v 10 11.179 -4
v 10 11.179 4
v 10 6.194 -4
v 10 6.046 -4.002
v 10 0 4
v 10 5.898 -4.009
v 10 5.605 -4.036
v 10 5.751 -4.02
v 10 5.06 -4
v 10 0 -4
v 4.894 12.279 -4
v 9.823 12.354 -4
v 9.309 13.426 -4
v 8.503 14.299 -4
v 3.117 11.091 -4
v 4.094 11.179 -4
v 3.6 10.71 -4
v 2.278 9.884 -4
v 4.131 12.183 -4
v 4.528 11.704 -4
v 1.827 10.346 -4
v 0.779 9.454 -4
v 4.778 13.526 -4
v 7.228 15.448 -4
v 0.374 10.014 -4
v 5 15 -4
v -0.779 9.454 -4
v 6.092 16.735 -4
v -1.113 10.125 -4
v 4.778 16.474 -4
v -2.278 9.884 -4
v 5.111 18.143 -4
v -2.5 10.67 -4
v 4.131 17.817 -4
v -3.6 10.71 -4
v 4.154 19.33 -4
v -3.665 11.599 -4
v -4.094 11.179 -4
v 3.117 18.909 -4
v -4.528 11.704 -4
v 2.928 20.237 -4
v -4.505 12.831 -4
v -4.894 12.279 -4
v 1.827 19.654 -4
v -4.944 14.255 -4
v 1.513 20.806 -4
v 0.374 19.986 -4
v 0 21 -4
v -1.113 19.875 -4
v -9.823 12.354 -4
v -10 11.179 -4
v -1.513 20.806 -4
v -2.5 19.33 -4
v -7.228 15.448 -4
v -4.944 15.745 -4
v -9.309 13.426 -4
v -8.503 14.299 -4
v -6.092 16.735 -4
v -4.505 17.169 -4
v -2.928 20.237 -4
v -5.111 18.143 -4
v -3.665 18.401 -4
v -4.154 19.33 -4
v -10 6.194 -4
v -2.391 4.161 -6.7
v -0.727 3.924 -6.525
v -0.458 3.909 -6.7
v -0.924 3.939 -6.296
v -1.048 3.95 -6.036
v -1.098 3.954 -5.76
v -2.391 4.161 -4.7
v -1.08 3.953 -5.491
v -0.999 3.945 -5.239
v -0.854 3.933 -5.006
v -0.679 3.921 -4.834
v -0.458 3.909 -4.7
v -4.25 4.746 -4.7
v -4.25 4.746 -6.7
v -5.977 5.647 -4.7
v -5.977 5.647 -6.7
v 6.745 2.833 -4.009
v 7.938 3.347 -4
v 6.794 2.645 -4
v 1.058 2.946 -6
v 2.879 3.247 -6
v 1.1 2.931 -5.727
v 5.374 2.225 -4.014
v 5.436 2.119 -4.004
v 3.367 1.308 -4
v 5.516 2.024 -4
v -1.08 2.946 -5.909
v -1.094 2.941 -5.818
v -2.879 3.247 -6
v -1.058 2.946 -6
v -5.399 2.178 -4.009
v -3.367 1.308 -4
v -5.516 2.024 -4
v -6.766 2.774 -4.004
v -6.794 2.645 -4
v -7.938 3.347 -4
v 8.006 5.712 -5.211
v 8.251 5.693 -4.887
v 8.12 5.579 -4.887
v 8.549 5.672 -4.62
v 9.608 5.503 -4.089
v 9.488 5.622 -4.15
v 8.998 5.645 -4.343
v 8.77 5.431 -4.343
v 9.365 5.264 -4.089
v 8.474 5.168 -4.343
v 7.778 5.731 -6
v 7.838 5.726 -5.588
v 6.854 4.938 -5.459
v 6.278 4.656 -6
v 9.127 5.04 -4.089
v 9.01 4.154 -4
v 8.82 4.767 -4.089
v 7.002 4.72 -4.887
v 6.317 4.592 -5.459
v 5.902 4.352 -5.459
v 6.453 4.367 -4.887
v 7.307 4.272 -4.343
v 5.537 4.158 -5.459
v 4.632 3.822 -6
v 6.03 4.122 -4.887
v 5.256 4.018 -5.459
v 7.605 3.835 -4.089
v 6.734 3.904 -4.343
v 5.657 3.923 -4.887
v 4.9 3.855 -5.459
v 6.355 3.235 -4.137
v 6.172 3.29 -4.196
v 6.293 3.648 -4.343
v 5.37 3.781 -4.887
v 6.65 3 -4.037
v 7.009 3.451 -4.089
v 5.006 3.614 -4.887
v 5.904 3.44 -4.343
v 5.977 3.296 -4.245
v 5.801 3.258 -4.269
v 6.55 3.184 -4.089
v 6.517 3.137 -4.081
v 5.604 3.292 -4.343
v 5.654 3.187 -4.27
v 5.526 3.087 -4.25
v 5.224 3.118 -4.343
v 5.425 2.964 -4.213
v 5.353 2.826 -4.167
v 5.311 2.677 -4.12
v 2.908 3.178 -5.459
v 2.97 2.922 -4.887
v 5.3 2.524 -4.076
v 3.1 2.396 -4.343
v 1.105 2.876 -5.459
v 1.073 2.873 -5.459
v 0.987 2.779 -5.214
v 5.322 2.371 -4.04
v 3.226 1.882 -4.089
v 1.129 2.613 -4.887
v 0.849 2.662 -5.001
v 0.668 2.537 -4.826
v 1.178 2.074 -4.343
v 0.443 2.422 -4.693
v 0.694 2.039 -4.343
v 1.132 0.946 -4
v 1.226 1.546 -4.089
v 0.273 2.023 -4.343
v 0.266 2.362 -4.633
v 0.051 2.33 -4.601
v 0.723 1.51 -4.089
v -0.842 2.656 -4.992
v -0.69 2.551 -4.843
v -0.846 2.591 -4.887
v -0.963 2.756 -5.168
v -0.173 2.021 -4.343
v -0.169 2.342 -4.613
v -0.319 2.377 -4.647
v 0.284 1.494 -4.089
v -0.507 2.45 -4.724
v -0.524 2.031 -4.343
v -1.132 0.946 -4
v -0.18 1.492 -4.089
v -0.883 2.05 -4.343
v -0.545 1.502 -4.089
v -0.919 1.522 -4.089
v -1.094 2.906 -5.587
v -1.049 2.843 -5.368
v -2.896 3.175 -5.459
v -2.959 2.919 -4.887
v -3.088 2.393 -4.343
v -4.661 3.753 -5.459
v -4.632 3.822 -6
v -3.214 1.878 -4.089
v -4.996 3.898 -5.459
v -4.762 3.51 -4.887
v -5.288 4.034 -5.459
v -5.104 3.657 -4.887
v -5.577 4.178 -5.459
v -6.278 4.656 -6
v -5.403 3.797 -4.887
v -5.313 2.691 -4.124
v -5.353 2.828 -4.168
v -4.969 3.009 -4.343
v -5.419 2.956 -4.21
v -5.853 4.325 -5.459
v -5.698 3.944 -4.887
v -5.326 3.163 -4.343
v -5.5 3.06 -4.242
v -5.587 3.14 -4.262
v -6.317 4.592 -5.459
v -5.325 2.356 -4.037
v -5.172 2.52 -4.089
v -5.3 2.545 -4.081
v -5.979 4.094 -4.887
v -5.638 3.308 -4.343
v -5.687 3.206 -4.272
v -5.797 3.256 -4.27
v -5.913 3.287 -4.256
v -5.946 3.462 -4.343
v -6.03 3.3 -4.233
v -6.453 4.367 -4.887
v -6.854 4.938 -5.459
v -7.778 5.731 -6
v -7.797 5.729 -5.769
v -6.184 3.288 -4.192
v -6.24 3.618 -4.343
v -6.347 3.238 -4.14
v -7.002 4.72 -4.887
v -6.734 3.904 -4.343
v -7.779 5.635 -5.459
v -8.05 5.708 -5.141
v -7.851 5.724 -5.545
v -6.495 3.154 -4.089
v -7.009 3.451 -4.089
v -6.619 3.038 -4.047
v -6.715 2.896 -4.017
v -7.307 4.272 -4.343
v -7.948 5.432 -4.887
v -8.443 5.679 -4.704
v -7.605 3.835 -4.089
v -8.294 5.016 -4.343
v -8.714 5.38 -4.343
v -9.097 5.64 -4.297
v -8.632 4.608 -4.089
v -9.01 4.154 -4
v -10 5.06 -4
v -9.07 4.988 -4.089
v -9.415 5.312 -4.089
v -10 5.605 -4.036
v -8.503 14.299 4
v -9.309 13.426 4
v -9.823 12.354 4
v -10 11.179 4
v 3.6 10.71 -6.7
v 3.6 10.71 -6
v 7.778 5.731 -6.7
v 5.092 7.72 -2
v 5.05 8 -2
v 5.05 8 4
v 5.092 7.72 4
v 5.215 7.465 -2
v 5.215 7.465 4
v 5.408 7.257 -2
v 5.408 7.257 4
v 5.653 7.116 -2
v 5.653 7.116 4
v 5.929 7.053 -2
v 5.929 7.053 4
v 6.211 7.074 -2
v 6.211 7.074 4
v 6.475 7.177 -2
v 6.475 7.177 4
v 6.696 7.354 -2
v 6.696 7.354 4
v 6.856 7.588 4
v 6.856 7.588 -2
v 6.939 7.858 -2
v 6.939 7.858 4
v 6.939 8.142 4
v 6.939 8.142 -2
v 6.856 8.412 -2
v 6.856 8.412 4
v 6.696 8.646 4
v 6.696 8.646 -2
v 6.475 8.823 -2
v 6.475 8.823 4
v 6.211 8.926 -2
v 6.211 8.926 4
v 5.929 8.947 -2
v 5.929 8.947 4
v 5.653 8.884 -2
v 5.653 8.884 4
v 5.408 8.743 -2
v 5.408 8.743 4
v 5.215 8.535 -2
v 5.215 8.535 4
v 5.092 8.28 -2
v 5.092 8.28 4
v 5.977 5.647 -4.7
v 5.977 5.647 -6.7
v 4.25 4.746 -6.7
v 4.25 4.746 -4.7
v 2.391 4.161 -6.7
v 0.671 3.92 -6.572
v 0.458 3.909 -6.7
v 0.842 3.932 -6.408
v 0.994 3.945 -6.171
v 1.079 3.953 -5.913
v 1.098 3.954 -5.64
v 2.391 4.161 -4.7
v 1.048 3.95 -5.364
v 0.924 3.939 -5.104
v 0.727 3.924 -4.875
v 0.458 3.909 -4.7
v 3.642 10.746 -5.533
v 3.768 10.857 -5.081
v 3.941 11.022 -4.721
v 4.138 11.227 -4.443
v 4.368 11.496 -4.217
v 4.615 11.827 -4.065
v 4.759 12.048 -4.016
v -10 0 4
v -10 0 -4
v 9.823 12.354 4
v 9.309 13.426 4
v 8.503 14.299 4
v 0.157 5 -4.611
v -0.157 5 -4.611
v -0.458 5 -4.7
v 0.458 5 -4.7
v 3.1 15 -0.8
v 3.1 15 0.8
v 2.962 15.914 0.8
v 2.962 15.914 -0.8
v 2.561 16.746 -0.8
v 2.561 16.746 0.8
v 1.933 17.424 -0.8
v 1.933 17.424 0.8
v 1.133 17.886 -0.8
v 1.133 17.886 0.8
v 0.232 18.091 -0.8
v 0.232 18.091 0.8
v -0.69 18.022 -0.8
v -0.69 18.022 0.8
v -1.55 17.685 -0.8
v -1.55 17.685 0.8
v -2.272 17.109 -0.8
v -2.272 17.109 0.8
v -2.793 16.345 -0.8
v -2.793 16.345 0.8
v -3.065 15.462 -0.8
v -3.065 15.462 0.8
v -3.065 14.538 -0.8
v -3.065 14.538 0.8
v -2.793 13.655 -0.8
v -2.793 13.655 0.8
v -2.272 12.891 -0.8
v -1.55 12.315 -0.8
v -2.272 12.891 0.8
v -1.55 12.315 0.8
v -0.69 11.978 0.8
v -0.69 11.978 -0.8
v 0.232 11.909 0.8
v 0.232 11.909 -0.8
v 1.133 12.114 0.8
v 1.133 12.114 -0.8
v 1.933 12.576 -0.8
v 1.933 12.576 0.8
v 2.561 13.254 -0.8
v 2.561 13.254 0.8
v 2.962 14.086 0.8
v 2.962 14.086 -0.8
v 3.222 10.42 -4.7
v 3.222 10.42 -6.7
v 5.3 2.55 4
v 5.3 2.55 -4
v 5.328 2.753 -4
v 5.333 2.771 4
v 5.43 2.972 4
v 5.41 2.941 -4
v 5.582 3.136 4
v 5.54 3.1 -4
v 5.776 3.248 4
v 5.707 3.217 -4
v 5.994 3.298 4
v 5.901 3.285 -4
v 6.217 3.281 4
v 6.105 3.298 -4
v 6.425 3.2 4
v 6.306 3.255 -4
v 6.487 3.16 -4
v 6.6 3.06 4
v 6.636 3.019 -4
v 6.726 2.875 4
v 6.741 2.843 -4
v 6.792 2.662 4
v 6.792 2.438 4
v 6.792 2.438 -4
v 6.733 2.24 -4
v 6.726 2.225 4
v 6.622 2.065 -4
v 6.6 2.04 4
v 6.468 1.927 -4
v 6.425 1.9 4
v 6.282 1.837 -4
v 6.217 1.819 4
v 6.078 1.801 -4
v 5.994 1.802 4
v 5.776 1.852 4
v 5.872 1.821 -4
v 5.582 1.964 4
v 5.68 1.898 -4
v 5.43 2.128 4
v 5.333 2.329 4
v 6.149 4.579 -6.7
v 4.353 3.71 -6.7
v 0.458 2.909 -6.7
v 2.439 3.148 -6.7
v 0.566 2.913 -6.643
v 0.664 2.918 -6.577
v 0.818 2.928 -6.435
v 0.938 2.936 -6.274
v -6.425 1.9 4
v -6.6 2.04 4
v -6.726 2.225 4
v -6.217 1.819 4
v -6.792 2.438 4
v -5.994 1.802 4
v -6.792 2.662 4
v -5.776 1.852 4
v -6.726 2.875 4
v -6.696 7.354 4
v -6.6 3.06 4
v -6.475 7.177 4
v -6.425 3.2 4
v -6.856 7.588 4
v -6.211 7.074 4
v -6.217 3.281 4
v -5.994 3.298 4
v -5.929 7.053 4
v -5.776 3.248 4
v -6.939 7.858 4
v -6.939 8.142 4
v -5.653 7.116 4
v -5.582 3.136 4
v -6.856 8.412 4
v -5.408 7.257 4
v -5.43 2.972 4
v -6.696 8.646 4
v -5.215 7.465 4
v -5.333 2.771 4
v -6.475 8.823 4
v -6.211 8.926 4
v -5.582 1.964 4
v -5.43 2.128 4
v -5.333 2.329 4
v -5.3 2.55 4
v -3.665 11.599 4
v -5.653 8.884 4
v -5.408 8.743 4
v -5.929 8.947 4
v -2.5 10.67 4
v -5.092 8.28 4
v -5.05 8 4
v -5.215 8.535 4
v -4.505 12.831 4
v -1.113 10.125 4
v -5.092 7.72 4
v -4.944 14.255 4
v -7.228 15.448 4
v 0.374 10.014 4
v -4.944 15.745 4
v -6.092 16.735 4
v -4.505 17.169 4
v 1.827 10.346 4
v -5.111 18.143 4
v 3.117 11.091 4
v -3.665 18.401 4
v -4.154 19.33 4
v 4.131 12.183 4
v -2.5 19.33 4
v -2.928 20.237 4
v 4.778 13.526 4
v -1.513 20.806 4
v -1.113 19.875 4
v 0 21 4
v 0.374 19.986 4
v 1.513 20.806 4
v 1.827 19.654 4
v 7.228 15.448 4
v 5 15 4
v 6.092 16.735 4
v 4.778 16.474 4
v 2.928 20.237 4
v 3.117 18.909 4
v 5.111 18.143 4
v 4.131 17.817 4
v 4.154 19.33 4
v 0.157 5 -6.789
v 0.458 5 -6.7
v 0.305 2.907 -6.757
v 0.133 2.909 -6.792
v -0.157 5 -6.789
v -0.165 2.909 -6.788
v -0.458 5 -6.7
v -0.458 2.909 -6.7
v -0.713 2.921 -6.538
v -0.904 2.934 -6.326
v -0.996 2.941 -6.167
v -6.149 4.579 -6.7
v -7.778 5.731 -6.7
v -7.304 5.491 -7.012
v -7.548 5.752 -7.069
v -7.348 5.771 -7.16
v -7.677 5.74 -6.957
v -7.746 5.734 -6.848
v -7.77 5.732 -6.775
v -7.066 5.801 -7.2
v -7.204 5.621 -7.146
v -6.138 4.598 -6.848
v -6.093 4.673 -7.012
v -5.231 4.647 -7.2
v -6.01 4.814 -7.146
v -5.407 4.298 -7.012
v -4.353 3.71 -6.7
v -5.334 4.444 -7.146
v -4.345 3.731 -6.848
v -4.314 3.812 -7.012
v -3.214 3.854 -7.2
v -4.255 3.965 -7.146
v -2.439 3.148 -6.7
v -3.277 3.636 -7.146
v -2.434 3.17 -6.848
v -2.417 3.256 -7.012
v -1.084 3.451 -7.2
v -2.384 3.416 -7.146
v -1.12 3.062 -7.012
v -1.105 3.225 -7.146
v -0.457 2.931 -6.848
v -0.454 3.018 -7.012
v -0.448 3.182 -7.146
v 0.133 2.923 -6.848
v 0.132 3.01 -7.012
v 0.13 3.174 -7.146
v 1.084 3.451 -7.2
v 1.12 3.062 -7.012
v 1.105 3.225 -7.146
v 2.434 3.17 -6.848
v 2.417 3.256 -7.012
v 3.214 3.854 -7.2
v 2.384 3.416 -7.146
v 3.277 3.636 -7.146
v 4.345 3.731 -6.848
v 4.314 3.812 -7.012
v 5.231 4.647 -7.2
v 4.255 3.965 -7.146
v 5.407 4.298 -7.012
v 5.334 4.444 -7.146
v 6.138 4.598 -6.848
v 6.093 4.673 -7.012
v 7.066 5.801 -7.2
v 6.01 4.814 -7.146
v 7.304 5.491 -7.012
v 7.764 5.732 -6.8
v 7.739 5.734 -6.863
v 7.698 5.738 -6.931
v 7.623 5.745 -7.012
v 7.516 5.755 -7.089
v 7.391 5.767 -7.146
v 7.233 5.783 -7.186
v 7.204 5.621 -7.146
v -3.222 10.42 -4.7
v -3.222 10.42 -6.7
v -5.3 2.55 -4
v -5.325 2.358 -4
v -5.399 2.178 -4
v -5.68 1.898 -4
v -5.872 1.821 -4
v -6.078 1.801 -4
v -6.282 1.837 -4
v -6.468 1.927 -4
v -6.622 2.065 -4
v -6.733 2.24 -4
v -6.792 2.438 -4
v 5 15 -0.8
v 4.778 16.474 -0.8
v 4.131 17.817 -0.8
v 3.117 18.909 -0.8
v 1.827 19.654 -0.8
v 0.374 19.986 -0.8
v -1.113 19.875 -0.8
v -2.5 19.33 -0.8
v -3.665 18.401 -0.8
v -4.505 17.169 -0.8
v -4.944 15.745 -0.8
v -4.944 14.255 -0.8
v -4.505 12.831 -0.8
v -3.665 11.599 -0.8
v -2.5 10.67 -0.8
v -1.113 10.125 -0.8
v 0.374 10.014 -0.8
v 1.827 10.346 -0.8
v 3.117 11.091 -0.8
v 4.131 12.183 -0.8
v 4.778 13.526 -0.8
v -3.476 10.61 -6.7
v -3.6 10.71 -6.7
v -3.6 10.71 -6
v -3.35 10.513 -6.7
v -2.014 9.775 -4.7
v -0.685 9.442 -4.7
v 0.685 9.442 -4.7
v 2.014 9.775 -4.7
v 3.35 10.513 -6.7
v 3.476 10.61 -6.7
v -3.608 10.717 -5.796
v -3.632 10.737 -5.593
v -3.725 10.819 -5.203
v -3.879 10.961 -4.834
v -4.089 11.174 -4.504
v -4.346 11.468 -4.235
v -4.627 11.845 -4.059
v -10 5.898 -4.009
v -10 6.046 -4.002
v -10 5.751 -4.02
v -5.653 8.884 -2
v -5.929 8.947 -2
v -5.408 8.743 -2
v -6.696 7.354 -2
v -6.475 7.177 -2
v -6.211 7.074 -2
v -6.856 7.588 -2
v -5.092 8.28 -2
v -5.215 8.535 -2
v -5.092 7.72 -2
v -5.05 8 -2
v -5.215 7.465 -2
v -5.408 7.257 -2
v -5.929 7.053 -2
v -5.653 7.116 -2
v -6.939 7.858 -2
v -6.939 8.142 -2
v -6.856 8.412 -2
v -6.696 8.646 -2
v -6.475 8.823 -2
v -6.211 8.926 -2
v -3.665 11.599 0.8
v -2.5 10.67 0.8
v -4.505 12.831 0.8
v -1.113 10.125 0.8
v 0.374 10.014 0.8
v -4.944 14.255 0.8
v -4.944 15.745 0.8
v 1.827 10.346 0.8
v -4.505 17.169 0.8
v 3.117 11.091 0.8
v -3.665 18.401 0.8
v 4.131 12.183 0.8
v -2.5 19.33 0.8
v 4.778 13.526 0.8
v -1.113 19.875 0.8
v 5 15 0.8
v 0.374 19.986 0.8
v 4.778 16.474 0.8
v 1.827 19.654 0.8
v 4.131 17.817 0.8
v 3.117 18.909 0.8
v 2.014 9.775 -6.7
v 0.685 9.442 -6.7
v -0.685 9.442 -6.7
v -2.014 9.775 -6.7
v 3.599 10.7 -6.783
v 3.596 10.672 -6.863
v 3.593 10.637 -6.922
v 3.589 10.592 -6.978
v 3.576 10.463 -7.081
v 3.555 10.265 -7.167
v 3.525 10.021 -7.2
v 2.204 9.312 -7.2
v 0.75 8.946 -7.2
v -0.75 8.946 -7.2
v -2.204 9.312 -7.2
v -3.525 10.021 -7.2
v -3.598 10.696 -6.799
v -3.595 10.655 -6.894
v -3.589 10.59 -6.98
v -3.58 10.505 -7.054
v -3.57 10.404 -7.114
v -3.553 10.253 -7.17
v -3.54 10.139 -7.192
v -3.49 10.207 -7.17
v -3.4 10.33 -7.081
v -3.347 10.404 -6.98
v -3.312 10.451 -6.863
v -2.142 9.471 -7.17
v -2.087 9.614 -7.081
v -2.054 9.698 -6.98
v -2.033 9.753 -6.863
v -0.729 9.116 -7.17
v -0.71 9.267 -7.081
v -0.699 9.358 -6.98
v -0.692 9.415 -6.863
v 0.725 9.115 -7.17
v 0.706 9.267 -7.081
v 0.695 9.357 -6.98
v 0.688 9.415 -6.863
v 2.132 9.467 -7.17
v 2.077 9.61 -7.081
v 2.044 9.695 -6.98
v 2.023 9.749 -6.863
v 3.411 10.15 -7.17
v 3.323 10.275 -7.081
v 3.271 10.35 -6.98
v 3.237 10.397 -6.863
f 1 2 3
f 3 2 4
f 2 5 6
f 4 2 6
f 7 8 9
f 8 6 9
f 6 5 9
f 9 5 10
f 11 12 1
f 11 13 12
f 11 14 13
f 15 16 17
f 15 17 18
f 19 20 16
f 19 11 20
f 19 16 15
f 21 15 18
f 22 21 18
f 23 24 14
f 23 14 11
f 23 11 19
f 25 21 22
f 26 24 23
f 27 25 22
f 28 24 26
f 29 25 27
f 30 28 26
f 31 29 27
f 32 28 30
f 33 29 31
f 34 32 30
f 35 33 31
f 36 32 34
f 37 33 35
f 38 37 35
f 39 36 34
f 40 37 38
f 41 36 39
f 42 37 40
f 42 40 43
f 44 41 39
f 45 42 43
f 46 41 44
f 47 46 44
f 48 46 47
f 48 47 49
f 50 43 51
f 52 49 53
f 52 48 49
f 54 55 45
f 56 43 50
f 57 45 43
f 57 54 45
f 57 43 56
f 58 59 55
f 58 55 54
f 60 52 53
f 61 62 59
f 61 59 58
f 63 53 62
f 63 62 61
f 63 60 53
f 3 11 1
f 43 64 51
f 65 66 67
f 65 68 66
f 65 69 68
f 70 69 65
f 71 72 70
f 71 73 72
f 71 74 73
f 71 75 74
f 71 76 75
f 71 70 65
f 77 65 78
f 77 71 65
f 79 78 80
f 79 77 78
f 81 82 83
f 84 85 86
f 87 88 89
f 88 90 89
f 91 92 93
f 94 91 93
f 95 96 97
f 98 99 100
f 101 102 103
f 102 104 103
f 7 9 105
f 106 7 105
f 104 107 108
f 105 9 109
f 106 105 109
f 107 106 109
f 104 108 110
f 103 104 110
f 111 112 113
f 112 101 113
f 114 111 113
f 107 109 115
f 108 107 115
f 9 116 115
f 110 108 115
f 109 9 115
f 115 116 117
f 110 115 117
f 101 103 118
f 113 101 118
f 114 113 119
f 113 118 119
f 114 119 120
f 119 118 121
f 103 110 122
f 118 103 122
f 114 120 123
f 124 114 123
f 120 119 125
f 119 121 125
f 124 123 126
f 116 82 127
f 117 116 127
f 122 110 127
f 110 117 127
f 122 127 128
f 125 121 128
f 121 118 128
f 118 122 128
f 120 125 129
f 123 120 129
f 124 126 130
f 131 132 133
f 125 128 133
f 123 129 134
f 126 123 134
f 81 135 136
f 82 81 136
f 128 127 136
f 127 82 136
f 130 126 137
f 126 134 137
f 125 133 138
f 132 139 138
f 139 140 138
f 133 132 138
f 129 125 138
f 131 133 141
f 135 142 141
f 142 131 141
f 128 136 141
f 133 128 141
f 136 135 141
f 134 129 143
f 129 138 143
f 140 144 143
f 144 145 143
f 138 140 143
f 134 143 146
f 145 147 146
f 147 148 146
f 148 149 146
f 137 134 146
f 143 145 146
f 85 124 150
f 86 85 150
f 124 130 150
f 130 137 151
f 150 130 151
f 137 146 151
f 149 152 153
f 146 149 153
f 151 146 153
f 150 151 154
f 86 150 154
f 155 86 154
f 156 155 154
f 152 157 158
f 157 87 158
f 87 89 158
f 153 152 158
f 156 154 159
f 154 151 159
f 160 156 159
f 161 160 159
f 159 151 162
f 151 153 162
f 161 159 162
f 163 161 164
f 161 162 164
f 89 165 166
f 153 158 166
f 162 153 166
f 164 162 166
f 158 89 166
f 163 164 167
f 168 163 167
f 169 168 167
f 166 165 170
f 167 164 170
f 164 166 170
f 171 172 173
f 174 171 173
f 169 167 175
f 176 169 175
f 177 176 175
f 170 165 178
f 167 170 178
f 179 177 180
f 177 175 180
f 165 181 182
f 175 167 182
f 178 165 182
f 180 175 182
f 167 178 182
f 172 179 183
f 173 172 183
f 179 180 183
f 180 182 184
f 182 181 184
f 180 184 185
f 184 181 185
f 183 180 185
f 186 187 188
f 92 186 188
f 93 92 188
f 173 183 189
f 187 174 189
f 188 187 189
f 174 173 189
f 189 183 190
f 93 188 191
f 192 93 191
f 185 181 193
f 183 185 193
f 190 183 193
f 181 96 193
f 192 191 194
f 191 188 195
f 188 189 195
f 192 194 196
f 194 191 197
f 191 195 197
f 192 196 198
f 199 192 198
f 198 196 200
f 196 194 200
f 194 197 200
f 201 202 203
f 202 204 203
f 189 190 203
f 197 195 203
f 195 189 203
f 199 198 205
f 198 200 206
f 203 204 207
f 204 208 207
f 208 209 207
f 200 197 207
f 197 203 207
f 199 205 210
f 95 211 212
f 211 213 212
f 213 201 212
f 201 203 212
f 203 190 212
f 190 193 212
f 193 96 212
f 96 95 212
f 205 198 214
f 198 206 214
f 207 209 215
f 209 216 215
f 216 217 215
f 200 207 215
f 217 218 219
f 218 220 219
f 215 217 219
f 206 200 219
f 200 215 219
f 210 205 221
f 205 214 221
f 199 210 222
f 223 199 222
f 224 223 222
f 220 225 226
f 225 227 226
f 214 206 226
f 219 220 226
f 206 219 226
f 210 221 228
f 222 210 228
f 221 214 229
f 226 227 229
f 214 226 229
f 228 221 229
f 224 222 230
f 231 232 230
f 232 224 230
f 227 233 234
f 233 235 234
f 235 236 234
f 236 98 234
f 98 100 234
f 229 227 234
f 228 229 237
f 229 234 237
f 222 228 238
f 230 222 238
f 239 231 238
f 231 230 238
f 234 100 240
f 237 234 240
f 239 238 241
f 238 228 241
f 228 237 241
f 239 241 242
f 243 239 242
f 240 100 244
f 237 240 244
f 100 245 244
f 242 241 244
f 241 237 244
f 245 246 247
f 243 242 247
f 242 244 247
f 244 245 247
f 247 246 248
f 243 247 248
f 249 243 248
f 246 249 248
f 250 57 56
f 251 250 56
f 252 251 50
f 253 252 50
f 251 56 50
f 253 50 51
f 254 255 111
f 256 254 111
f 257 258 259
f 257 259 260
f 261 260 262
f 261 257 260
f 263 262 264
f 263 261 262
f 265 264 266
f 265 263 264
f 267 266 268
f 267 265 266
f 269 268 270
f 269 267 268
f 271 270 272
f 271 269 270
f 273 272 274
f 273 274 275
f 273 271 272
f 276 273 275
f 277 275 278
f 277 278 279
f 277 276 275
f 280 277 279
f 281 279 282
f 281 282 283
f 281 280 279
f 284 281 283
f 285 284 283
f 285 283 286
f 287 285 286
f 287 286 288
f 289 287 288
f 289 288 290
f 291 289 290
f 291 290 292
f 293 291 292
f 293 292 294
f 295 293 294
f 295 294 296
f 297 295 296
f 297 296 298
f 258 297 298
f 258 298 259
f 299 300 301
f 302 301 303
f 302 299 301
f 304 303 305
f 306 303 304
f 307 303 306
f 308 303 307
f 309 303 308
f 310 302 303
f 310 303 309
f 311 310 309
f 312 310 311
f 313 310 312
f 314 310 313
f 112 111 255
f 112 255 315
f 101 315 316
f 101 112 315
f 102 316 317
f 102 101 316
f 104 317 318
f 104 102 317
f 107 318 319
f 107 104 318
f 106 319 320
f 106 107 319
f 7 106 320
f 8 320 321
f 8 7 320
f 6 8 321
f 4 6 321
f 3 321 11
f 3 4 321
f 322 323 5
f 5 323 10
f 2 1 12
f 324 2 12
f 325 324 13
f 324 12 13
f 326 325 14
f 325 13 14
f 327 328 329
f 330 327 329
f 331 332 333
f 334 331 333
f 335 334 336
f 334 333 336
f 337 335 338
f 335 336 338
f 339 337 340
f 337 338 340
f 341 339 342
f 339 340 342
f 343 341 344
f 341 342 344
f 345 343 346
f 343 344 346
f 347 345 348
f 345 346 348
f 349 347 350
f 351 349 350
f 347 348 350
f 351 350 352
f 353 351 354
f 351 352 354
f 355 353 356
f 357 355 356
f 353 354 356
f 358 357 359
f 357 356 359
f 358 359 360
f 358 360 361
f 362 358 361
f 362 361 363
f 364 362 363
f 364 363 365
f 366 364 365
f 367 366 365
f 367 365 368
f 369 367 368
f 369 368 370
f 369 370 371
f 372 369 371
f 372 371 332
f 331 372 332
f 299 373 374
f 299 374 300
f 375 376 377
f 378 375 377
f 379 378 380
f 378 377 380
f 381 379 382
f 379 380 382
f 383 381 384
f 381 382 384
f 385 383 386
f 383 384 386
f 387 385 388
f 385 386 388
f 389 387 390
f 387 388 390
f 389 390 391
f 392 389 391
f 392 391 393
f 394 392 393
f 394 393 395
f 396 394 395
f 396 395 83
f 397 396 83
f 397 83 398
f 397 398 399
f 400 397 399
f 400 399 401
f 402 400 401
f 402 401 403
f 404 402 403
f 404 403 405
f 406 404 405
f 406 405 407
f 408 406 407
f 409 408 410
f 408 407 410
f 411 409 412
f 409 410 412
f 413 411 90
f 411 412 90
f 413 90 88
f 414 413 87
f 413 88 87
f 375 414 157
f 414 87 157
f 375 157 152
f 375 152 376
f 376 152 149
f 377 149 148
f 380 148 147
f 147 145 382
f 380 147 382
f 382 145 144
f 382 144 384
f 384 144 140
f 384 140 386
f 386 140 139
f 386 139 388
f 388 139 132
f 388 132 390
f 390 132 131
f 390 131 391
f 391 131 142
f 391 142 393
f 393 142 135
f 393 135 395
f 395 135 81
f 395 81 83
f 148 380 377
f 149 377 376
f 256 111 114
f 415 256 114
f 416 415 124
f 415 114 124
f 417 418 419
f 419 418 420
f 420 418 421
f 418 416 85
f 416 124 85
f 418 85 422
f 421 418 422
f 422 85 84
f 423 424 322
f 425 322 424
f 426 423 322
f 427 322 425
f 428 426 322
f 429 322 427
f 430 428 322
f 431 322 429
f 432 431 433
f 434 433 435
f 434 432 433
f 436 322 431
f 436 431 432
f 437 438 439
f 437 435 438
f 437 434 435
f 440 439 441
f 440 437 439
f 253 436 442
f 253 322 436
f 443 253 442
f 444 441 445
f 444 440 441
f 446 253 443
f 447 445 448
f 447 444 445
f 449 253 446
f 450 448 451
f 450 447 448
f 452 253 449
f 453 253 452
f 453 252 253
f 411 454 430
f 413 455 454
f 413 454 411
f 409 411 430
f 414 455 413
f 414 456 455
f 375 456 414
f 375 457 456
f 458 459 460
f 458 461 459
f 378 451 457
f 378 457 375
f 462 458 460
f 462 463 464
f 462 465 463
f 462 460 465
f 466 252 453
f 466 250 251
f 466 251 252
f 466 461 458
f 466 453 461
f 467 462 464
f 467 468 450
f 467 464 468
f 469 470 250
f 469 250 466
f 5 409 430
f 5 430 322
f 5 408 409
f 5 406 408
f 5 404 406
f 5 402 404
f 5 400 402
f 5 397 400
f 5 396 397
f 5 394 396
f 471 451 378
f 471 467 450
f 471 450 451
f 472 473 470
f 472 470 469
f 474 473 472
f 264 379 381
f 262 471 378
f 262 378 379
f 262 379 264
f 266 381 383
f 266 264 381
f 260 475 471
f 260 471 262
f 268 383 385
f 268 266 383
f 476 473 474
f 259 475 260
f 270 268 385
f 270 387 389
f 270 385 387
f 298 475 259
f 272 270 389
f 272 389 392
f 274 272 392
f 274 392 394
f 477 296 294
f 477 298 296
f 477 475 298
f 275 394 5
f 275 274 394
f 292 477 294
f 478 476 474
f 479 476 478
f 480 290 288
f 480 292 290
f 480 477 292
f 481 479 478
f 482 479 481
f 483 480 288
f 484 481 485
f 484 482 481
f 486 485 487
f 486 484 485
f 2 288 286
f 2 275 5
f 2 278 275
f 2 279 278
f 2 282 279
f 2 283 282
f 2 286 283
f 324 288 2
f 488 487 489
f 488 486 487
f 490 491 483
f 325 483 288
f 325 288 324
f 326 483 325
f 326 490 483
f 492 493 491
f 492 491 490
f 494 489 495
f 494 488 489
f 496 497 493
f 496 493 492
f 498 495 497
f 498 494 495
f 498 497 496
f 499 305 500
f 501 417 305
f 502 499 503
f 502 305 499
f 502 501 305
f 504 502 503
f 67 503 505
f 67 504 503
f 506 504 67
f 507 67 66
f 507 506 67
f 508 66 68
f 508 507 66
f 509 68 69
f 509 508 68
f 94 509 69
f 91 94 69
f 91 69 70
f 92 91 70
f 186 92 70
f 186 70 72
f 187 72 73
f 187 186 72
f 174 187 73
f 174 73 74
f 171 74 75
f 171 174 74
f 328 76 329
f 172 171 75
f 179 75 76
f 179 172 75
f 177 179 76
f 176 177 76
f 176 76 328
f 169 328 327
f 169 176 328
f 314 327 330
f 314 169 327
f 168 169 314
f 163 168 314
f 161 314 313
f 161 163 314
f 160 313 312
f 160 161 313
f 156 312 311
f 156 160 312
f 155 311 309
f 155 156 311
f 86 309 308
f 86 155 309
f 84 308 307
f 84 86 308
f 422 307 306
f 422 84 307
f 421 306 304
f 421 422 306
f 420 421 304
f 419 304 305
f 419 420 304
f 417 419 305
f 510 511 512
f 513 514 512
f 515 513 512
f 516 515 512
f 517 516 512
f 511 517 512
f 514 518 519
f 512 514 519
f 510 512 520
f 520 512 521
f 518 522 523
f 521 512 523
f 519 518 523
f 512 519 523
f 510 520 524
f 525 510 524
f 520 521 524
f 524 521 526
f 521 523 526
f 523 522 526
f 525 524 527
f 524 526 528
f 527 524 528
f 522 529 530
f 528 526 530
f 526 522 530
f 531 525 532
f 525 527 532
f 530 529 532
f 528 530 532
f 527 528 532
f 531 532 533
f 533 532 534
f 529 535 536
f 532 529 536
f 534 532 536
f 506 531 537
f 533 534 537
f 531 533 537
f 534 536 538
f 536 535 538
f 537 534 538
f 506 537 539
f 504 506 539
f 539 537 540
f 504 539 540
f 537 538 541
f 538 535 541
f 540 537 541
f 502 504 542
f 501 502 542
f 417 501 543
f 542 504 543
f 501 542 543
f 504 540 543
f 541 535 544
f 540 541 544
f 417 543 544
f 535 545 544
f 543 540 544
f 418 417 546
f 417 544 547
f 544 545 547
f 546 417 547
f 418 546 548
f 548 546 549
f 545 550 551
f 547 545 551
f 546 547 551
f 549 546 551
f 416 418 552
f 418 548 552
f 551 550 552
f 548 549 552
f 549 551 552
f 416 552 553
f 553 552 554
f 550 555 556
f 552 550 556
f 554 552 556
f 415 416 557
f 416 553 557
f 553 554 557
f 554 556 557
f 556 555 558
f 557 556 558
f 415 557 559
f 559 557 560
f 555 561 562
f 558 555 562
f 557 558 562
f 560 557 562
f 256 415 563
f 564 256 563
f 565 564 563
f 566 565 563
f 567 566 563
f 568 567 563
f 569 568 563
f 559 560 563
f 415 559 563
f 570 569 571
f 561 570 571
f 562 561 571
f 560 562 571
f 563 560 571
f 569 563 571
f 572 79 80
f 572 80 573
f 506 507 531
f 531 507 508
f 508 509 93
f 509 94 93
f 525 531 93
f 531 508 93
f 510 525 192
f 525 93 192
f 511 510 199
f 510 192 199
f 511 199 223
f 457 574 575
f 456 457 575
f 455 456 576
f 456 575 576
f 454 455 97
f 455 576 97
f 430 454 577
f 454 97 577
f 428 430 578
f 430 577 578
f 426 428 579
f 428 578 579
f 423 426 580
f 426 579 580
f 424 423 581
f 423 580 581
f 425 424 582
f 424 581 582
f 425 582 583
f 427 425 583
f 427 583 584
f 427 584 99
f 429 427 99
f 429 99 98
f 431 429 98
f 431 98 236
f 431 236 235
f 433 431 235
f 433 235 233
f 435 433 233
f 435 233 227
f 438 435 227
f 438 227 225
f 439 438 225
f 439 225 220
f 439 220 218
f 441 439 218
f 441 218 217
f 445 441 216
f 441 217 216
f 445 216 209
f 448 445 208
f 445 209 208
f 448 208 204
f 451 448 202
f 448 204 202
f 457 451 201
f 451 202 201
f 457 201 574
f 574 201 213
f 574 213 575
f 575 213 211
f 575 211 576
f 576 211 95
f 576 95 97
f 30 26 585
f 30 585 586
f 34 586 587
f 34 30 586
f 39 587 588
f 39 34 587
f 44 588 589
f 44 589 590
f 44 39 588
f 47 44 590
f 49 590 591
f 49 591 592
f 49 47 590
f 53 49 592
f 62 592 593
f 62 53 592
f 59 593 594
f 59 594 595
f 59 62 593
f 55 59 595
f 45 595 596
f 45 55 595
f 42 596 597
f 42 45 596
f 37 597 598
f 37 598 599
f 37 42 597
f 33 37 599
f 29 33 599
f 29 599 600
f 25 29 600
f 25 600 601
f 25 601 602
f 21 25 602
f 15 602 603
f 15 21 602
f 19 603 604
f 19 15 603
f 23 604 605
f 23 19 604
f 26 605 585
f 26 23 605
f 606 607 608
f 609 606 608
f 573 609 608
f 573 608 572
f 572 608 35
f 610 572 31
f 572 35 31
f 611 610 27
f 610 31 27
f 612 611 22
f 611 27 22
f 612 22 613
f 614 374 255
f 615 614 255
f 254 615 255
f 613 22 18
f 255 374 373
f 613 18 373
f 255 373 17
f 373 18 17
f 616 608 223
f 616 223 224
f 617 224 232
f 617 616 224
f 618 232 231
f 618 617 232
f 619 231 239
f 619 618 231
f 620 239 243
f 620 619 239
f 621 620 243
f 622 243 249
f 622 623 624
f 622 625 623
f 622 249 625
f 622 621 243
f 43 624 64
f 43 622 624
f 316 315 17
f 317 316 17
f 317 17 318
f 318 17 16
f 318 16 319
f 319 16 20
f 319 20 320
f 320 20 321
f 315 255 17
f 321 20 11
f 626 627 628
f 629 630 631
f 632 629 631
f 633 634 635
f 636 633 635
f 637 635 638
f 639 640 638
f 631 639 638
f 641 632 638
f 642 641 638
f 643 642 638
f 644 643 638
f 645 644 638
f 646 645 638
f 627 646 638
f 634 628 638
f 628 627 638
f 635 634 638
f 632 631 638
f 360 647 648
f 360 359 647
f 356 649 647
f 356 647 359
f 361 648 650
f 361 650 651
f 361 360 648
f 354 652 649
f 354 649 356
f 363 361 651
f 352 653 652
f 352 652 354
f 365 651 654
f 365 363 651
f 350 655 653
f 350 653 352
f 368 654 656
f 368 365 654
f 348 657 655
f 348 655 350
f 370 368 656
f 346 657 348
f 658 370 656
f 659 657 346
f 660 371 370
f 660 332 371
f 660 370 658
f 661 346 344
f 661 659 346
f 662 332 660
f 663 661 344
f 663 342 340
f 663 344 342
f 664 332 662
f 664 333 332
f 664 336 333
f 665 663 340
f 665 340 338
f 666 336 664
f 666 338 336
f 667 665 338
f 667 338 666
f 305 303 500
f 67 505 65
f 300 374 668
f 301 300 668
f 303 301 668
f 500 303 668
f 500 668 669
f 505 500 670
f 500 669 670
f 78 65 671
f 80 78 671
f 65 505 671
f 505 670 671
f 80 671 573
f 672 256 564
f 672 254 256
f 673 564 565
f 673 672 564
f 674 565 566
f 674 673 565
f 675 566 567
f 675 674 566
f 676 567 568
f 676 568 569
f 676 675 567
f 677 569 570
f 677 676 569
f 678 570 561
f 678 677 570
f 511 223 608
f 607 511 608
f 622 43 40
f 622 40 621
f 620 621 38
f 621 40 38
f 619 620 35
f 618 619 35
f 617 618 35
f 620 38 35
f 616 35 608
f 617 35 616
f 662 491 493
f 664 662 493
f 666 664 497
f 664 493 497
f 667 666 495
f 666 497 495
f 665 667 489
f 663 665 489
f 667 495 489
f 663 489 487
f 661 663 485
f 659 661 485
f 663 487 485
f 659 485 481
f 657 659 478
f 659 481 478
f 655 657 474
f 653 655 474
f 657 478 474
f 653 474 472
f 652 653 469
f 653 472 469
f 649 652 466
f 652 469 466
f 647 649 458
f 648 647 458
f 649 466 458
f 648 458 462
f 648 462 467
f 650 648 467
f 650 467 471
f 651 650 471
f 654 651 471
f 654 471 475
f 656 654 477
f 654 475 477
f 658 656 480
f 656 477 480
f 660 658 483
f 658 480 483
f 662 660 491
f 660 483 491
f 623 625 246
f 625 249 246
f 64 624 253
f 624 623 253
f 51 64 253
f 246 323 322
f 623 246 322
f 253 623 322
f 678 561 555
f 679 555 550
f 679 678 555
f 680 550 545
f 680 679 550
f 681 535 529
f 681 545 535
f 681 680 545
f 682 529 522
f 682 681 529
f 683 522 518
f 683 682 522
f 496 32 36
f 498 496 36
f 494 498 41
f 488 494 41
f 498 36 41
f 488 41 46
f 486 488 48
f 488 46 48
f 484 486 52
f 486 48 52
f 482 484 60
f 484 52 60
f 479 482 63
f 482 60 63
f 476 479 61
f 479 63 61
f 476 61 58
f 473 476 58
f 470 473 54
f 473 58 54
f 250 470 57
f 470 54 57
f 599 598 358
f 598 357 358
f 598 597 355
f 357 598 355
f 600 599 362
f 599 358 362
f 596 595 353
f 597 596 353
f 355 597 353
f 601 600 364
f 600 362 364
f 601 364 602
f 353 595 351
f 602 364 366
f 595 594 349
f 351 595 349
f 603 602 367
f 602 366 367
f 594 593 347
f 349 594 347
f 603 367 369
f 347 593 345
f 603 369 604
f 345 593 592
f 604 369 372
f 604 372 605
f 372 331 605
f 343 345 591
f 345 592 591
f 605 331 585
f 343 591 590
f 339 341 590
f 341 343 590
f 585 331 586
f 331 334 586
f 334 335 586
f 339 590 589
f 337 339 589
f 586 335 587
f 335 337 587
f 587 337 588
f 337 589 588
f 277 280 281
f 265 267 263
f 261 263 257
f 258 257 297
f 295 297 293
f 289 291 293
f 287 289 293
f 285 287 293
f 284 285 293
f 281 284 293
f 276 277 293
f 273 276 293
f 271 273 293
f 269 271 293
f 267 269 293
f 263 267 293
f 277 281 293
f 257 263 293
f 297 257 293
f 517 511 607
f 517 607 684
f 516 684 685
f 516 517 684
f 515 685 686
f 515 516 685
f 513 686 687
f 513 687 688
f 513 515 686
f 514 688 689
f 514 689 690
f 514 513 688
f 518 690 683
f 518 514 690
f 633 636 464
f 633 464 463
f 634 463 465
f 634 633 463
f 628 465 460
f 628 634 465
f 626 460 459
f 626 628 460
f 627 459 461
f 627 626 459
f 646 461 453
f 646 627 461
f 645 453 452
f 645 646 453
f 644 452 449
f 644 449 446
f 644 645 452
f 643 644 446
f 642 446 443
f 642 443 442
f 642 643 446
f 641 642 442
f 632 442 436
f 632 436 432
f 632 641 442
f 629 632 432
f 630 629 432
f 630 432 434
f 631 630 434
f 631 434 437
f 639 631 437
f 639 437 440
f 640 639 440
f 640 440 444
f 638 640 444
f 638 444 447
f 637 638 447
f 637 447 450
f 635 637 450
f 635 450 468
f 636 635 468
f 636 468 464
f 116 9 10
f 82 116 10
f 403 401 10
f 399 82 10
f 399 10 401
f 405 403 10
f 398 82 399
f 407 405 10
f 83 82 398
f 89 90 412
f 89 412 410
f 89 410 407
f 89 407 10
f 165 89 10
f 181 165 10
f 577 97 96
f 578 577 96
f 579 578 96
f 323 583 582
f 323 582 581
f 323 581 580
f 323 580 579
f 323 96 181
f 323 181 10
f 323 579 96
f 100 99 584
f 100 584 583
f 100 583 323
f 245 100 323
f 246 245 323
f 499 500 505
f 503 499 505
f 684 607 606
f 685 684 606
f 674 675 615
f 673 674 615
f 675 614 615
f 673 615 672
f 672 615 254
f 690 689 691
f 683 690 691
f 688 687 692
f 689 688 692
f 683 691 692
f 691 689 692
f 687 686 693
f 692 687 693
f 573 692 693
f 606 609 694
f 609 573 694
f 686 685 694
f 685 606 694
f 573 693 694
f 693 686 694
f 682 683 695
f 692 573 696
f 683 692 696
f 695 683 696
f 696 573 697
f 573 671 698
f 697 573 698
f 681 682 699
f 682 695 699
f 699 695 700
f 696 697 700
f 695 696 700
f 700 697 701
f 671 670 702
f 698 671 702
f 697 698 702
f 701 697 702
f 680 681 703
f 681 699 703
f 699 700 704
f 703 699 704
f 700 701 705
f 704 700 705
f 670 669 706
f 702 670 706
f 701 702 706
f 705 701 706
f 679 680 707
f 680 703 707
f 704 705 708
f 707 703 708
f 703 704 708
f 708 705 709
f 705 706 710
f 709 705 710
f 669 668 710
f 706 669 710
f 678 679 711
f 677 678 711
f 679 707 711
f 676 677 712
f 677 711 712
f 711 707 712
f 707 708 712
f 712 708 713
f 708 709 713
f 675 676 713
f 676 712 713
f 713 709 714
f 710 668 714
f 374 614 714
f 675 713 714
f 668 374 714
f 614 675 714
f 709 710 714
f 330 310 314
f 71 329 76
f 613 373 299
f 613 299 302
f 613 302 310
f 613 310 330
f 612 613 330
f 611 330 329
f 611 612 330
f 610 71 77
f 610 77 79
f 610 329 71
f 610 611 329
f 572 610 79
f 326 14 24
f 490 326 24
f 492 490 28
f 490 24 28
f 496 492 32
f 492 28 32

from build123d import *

# Parameters (mm, degrees)
EXTRUDE_1_DEPTH          = 4
EXTRUDE_1_DEPTH_BACK     = 4
SKETCH_2_R               = 0.95
SKETCH_2_R_2             = 0.75
SKETCH_3_R               = 5
CUT_EXTRUDE_1_DEPTH      = 3.2
SKETCH_6_R               = 3.1
CUT_EXTRUDE_2_DEPTH      = 24.749526311
EXTRUDE_3_DEPTH          = 3.2
CUT_EXTRUDE_3_DEPTH      = 1.2
CUT_EXTRUDE_3_DEPTH_BACK = 0.8
SKETCH_10_R              = 0.95
EXTRUDE_4_DEPTH          = 2
FILLET_4_R               = 2
FILLET_START             = -7
FILLET_5_2_DEPTH         = 9
FILLET_START_2           = -2
FILLET_5_3_DEPTH         = 9
SKETCH_11_R              = 1.1
CUT_EXTRUDE_4_DEPTH      = 5


with BuildPart() as part:
    # 草图2 → 凸台-拉伸1 (new, two sides: drawn at the far end of the back side and taken through both)
    with BuildSketch(Plane.XY.offset(-EXTRUDE_1_DEPTH_BACK)):
        with BuildLine():
            Line((-10, 11.178983643), (-10, 0))
            Line((-10, 0), (10, 0))
            Line((10, 0), (10, 11.178983643))
            ThreePointArc((10, 11.178983643), (9.606342006, 12.909387452), (8.502851331, 14.299197613))
            ThreePointArc((8.502851331, 14.299197613), (6.641519688, 16.075059286), (5.11101252, 18.142857143))
            ThreePointArc((5.11101252, 18.142857143), (0, 21), (-5.11101252, 18.142857143))
            ThreePointArc((-5.11101252, 18.142857143), (-6.641519688, 16.075059286), (-8.502851331, 14.299197613))
            ThreePointArc((-8.502851331, 14.299197613), (-9.606342006, 12.909387452), (-10, 11.178983643))
        make_face()
        with Locations((-6, 8)):
            Circle(SKETCH_2_R, mode=Mode.SUBTRACT)
        with Locations((-6.05, 2.55)):
            Circle(SKETCH_2_R_2, mode=Mode.SUBTRACT)
        with Locations(Location((6.05, 2.55, 0), (0, 0, 180))):
            Circle(SKETCH_2_R_2, mode=Mode.SUBTRACT)
        with Locations(Location((6, 8, 0), (0, 0, 180))):
            Circle(SKETCH_2_R, mode=Mode.SUBTRACT)
    extrude(amount=EXTRUDE_1_DEPTH + EXTRUDE_1_DEPTH_BACK)

    # 草图3 → 切除-拉伸1 (cut)
    with BuildSketch(Plane.XY.offset(4)):
        with Locations((0, 15)):
            Circle(SKETCH_3_R)
    cut_extrude_1 = extrude(amount=-CUT_EXTRUDE_1_DEPTH, mode=Mode.SUBTRACT)

    # 镜向1: 切除-拉伸1 across plane
    add(cut_extrude_1.mirror(Plane.XY), mode=Mode.SUBTRACT)

    # 草图6 → 切除-拉伸2 (cut, through all)
    with BuildSketch(Plane.XY.offset(0.8)):
        with Locations((0, 15)):
            Circle(SKETCH_6_R)
    extrude(amount=-CUT_EXTRUDE_2_DEPTH, mode=Mode.SUBTRACT)

    # 草图8 → 凸台-拉伸3 (add)
    with BuildSketch(Plane(origin=(0, 0, -4), x_dir=(-1, 0, 0), z_dir=(0, 0, -1))):
        with BuildLine():
            Line((-3.599610614, 10.710151119), (-7.777730077, 5.730862238))
            ThreePointArc((-7.777730077, 5.730862238), (0, 2.9), (7.777730077, 5.730862238))
            Line((7.777730077, 5.730862238), (3.599610614, 10.710151119))
            ThreePointArc((3.599610614, 10.710151119), (0, 9.4), (-3.599610614, 10.710151119))
        make_face()
    extrude(amount=EXTRUDE_3_DEPTH)

    # 草图9 → 切除-拉伸3 (cut, two sides: drawn at the far end of the back side and taken through both)
    with BuildSketch(Plane(origin=(0, 0, -5.5), x_dir=(-1, 0, 0), z_dir=(0, 0, -1)).offset(-CUT_EXTRUDE_3_DEPTH_BACK)):
        with BuildLine():
            Line((-3.221829655, 10.419627344), (-5.977379212, 5.646875508))
            ThreePointArc((-5.977379212, 5.646875508), (0, 3.9), (5.977379212, 5.646875508))
            Line((5.977379212, 5.646875508), (3.221829655, 10.419627344))
            ThreePointArc((3.221829655, 10.419627344), (0, 9.4), (-3.221829655, 10.419627344))
        make_face()
    extrude(amount=CUT_EXTRUDE_3_DEPTH + CUT_EXTRUDE_3_DEPTH_BACK, mode=Mode.SUBTRACT)

    # 草图10 → 凸台-拉伸4 (add)
    with BuildSketch(Plane(origin=(0, 0, -4), x_dir=(-1, 0, 0), z_dir=(0, 0, -1))):
        with Locations((-6, 8)):
            Circle(SKETCH_10_R)
        with Locations(Location((6, 8, 0), (0, 0, 180))):
            Circle(SKETCH_10_R)
    extrude(amount=-EXTRUDE_4_DEPTH)

    # 圆角4
    # the kernel refuses this fillet: 2 mm, written as the material it adds along each edge
    with BuildSketch(Plane(origin=(10.991668126, 1.900640023, -4), x_dir=(0.7660444431189769, 0.6427876096865407, 0), z_dir=(-0.6427876096865407, 0.7660444431189769, 0))) as fillet_4_piece_1_section:
        with BuildLine():
            CenterArc((FILLET_4_R, FILLET_4_R), FILLET_4_R, 180, 90)
            Line((0, FILLET_4_R), (0, 0))
            Line((0, 0), (FILLET_4_R, 0))
        make_face()
    fillet_4_piece_1 = extrude(amount=16.5, mode=Mode.PRIVATE)
    fillet_4_piece_1 = fillet_4_piece_1 - Plane(origin=(0, 15, -4), x_dir=(-0.6427876096865404, -0.7660444431189772, 0), z_dir=(0, 0, 1)) * Cylinder(5.6, 42, mode=Mode.PRIVATE)
    fillet_4_piece_1 = fillet_4_piece_1 & Plane(origin=(0, 15, -4), x_dir=(0.6427876096865403, -0.7660444431189773, 0), z_dir=(0, 0, 1)) * Cylinder(12.1, 42, mode=Mode.PRIVATE)
    add(fillet_4_piece_1)
    with BuildSketch(Plane(origin=(-0.385672566, 14.540373334, -4), x_dir=(-0.766044443118977, 0.6427876096865406, 0), z_dir=(-0.6427876096865406, -0.7660444431189771, 0))) as fillet_4_piece_2_section:
        with BuildLine():
            CenterArc((FILLET_4_R, FILLET_4_R), FILLET_4_R, 180, 90)
            Line((0, FILLET_4_R), (0, 0))
            Line((0, 0), (FILLET_4_R, 0))
        make_face()
    fillet_4_piece_2 = extrude(amount=16.5, mode=Mode.PRIVATE)
    fillet_4_piece_2 = fillet_4_piece_2 - Plane(origin=(0, 15, -4), x_dir=(-0.6427876096865404, -0.7660444431189772, 0), z_dir=(0, 0, 1)) * Cylinder(5.6, 42, mode=Mode.PRIVATE)
    fillet_4_piece_2 = fillet_4_piece_2 & Plane(origin=(0, 15, -4), x_dir=(0.6427876096865403, -0.7660444431189773, 0), z_dir=(0, 0, 1)) * Cylinder(12.1, 42, mode=Mode.PRIVATE)
    add(fillet_4_piece_2)
    with BuildSketch(Plane(origin=(0, 15, -4), x_dir=(0.6427876096865403, -0.7660444431189772, 0), z_dir=(0.7660444431189772, 0.6427876096865403, 0))) as fillet_4_piece_3_section:
        with BuildLine():
            CenterArc((12.1 + FILLET_4_R, FILLET_4_R), FILLET_4_R, 180, 90)
            Line((12.1, FILLET_4_R), (12.1, 0))
            Line((12.1, 0), (12.1 + FILLET_4_R, 0))
        make_face()
    fillet_4_piece_3 = revolve(axis=Axis((0, 15, -4), (0, 0, -1)), revolution_arc=80, mode=Mode.PRIVATE)
    fillet_4_piece_3 = fillet_4_piece_3 - Plane(origin=(-6.05, 2.55, -4), x_dir=(1, 0, 0), z_dir=(0, 0, -1)) * Cylinder(0.75, 57, mode=Mode.PRIVATE)
    fillet_4_piece_3 = fillet_4_piece_3 - Plane(origin=(6.05, 2.55, -4), x_dir=(-1, 0, 0), z_dir=(0, 0, -1)) * Cylinder(0.75, 57, mode=Mode.PRIVATE)
    add(fillet_4_piece_3)
    with BuildSketch(Plane(origin=(10.991668126, 1.900640023, -4), x_dir=(0.7660444431189769, 0.6427876096865407, 0), z_dir=(-0.6427876096865407, 0.7660444431189769, 0))) as fillet_4_piece_4a_section:
        with BuildLine():
            CenterArc((FILLET_4_R, FILLET_4_R), FILLET_4_R, 180, 90)
            Line((0, FILLET_4_R), (0, 0))
            Line((0, 0), (FILLET_4_R, 0))
        make_face()
    fillet_4_piece_4a = extrude(amount=16.5, mode=Mode.PRIVATE)
    fillet_4_piece_4a = split(fillet_4_piece_4a, bisect_by=Plane(origin=(10, 1.900640023, -4), z_dir=(-1, 0, 0)), keep=Keep.TOP, mode=Mode.PRIVATE)
    fillet_4_piece_4a = fillet_4_piece_4a - Plane(origin=(0, 15, -4), x_dir=(0.6427876096865403, -0.7660444431189773, 0), z_dir=(0, 0, 1)) * Cylinder(12.1, 42, mode=Mode.PRIVATE)
    with BuildSketch(Plane(origin=(0, 15, -4), x_dir=(0.8963584591585163, -0.44333002683663375, 0), z_dir=(0.44333002683663375, 0.8963584591585163, 0))) as fillet_4_piece_4b_section:
        with BuildLine():
            CenterArc((12.1 + FILLET_4_R, FILLET_4_R), FILLET_4_R, 180, 90)
            Line((12.1, FILLET_4_R), (12.1, 0))
            Line((12.1, 0), (12.1 + FILLET_4_R, 0))
        make_face()
    fillet_4_piece_4b = revolve(axis=Axis((0, 15, -4), (0, 0, -1)), revolution_arc=103.683456225, mode=Mode.PRIVATE)
    fillet_4_piece_4b = split(fillet_4_piece_4b, bisect_by=Plane(origin=(10, 15, -4), z_dir=(-1, 0, 0)), keep=Keep.TOP, mode=Mode.PRIVATE)
    fillet_4_piece_4b = split(fillet_4_piece_4b, bisect_by=Plane(origin=(0, 15, -4), z_dir=(0.7660444431189771, 0.6427876096865406, 0)), keep=Keep.TOP, mode=Mode.PRIVATE)
    fillet_4_piece_4 = fillet_4_piece_4a & fillet_4_piece_4b
    add(fillet_4_piece_4)
    with BuildSketch(Plane(origin=(-0.385672566, 14.540373334, -4), x_dir=(-0.766044443118977, 0.6427876096865406, 0), z_dir=(-0.6427876096865406, -0.7660444431189771, 0))) as fillet_4_piece_5a_section:
        with BuildLine():
            CenterArc((FILLET_4_R, FILLET_4_R), FILLET_4_R, 180, 90)
            Line((0, FILLET_4_R), (0, 0))
            Line((0, 0), (FILLET_4_R, 0))
        make_face()
    fillet_4_piece_5a = extrude(amount=16.5, mode=Mode.PRIVATE)
    fillet_4_piece_5a = split(fillet_4_piece_5a, bisect_by=Plane(origin=(-10, 14.540373334, -4), z_dir=(1, 0, 0)), keep=Keep.TOP, mode=Mode.PRIVATE)
    fillet_4_piece_5a = fillet_4_piece_5a - Plane(origin=(0, 15, -4), x_dir=(0.6427876096865403, -0.7660444431189773, 0), z_dir=(0, 0, 1)) * Cylinder(12.1, 42, mode=Mode.PRIVATE)
    with BuildSketch(Plane(origin=(0, 15, -4), x_dir=(0.6427876096865403, -0.7660444431189772, 0), z_dir=(0.7660444431189772, 0.6427876096865403, 0))) as fillet_4_piece_5b_section:
        with BuildLine():
            CenterArc((12.1 + FILLET_4_R, FILLET_4_R), FILLET_4_R, 180, 90)
            Line((12.1, FILLET_4_R), (12.1, 0))
            Line((12.1, 0), (12.1 + FILLET_4_R, 0))
        make_face()
    fillet_4_piece_5b = revolve(axis=Axis((0, 15, -4), (0, 0, -1)), revolution_arc=103.683456225, mode=Mode.PRIVATE)
    fillet_4_piece_5b = split(fillet_4_piece_5b, bisect_by=Plane(origin=(-10, 15, -4), z_dir=(1, 0, 0)), keep=Keep.TOP, mode=Mode.PRIVATE)
    fillet_4_piece_5b = split(fillet_4_piece_5b, bisect_by=Plane(origin=(0, 15, -4), z_dir=(-0.7660444431189771, 0.6427876096865406, 0)), keep=Keep.TOP, mode=Mode.PRIVATE)
    fillet_4_piece_5 = fillet_4_piece_5a & fillet_4_piece_5b
    add(fillet_4_piece_5)

    # 圆角5: read off the stored shape, not the designer's step
    # 圆角5 outline → 圆角5 (revolve, cut)
    with BuildSketch(Plane.XZ.offset(-15)):
        with BuildLine():
            Line((12.1, -7.2), (12.1, -6.7))
            ThreePointArc((12.1, -6.7), (11.953553391, -7.053553391), (11.6, -7.2))
            Line((11.6, -7.2), (12.1, -7.2))
        make_face()
        with BuildLine():
            Line((5.6, -7.2), (6.1, -7.2))
            ThreePointArc((6.1, -7.2), (5.746446609, -7.053553391), (5.6, -6.7))
            Line((5.6, -6.7), (5.6, -7.2))
        make_face()
    revolve(axis=Axis((0, 15, 0), (0, 0, 1)), mode=Mode.SUBTRACT)

    # Fillet 5 2 outline → Fillet 5 2 (cut)
    with BuildSketch(Plane(origin=(0, 0, 0), x_dir=(0.7660444431189767, 0.6427876096865409, 0), z_dir=(0.6427876096865409, -0.7660444431189768, 0)).offset(FILLET_START)):
        with BuildLine():
            Line((9.641814145, -7.2), (9.641814145, -6.7))
            ThreePointArc((9.641814145, -6.7), (9.495367536, -7.053553391), (9.141814145, -7.2))
            Line((9.141814145, -7.2), (9.641814145, -7.2))
        make_face()
    extrude(amount=FILLET_5_2_DEPTH, mode=Mode.SUBTRACT)

    # Fillet 5 3 outline → Fillet 5 3 (cut)
    with BuildSketch(Plane(origin=(0, 0, 0), x_dir=(0.7660444431189767, -0.6427876096865409, 0), z_dir=(0.6427876096865409, 0.7660444431189768, 0)).offset(FILLET_START_2)):
        with BuildLine():
            Line((-9.641814145, 7.2), (-9.641814145, 6.7))
            ThreePointArc((-9.641814145, 6.7), (-9.495367536, 7.053553391), (-9.141814145, 7.2))
            Line((-9.141814145, 7.2), (-9.641814145, 7.2))
        make_face()
    extrude(amount=FILLET_5_3_DEPTH, mode=Mode.SUBTRACT)

    # 草图11 → 切除-拉伸4 (cut)
    with BuildSketch(Plane(origin=(0, 0, 0), x_dir=(1, 0, 0), z_dir=(0, 1, 0))):
        with Locations(Location((0, 5.7, 0), (0, 0, 65.380022671))):
            Circle(SKETCH_11_R)
    extrude(amount=CUT_EXTRUDE_4_DEPTH, mode=Mode.SUBTRACT)


solid = part.part
